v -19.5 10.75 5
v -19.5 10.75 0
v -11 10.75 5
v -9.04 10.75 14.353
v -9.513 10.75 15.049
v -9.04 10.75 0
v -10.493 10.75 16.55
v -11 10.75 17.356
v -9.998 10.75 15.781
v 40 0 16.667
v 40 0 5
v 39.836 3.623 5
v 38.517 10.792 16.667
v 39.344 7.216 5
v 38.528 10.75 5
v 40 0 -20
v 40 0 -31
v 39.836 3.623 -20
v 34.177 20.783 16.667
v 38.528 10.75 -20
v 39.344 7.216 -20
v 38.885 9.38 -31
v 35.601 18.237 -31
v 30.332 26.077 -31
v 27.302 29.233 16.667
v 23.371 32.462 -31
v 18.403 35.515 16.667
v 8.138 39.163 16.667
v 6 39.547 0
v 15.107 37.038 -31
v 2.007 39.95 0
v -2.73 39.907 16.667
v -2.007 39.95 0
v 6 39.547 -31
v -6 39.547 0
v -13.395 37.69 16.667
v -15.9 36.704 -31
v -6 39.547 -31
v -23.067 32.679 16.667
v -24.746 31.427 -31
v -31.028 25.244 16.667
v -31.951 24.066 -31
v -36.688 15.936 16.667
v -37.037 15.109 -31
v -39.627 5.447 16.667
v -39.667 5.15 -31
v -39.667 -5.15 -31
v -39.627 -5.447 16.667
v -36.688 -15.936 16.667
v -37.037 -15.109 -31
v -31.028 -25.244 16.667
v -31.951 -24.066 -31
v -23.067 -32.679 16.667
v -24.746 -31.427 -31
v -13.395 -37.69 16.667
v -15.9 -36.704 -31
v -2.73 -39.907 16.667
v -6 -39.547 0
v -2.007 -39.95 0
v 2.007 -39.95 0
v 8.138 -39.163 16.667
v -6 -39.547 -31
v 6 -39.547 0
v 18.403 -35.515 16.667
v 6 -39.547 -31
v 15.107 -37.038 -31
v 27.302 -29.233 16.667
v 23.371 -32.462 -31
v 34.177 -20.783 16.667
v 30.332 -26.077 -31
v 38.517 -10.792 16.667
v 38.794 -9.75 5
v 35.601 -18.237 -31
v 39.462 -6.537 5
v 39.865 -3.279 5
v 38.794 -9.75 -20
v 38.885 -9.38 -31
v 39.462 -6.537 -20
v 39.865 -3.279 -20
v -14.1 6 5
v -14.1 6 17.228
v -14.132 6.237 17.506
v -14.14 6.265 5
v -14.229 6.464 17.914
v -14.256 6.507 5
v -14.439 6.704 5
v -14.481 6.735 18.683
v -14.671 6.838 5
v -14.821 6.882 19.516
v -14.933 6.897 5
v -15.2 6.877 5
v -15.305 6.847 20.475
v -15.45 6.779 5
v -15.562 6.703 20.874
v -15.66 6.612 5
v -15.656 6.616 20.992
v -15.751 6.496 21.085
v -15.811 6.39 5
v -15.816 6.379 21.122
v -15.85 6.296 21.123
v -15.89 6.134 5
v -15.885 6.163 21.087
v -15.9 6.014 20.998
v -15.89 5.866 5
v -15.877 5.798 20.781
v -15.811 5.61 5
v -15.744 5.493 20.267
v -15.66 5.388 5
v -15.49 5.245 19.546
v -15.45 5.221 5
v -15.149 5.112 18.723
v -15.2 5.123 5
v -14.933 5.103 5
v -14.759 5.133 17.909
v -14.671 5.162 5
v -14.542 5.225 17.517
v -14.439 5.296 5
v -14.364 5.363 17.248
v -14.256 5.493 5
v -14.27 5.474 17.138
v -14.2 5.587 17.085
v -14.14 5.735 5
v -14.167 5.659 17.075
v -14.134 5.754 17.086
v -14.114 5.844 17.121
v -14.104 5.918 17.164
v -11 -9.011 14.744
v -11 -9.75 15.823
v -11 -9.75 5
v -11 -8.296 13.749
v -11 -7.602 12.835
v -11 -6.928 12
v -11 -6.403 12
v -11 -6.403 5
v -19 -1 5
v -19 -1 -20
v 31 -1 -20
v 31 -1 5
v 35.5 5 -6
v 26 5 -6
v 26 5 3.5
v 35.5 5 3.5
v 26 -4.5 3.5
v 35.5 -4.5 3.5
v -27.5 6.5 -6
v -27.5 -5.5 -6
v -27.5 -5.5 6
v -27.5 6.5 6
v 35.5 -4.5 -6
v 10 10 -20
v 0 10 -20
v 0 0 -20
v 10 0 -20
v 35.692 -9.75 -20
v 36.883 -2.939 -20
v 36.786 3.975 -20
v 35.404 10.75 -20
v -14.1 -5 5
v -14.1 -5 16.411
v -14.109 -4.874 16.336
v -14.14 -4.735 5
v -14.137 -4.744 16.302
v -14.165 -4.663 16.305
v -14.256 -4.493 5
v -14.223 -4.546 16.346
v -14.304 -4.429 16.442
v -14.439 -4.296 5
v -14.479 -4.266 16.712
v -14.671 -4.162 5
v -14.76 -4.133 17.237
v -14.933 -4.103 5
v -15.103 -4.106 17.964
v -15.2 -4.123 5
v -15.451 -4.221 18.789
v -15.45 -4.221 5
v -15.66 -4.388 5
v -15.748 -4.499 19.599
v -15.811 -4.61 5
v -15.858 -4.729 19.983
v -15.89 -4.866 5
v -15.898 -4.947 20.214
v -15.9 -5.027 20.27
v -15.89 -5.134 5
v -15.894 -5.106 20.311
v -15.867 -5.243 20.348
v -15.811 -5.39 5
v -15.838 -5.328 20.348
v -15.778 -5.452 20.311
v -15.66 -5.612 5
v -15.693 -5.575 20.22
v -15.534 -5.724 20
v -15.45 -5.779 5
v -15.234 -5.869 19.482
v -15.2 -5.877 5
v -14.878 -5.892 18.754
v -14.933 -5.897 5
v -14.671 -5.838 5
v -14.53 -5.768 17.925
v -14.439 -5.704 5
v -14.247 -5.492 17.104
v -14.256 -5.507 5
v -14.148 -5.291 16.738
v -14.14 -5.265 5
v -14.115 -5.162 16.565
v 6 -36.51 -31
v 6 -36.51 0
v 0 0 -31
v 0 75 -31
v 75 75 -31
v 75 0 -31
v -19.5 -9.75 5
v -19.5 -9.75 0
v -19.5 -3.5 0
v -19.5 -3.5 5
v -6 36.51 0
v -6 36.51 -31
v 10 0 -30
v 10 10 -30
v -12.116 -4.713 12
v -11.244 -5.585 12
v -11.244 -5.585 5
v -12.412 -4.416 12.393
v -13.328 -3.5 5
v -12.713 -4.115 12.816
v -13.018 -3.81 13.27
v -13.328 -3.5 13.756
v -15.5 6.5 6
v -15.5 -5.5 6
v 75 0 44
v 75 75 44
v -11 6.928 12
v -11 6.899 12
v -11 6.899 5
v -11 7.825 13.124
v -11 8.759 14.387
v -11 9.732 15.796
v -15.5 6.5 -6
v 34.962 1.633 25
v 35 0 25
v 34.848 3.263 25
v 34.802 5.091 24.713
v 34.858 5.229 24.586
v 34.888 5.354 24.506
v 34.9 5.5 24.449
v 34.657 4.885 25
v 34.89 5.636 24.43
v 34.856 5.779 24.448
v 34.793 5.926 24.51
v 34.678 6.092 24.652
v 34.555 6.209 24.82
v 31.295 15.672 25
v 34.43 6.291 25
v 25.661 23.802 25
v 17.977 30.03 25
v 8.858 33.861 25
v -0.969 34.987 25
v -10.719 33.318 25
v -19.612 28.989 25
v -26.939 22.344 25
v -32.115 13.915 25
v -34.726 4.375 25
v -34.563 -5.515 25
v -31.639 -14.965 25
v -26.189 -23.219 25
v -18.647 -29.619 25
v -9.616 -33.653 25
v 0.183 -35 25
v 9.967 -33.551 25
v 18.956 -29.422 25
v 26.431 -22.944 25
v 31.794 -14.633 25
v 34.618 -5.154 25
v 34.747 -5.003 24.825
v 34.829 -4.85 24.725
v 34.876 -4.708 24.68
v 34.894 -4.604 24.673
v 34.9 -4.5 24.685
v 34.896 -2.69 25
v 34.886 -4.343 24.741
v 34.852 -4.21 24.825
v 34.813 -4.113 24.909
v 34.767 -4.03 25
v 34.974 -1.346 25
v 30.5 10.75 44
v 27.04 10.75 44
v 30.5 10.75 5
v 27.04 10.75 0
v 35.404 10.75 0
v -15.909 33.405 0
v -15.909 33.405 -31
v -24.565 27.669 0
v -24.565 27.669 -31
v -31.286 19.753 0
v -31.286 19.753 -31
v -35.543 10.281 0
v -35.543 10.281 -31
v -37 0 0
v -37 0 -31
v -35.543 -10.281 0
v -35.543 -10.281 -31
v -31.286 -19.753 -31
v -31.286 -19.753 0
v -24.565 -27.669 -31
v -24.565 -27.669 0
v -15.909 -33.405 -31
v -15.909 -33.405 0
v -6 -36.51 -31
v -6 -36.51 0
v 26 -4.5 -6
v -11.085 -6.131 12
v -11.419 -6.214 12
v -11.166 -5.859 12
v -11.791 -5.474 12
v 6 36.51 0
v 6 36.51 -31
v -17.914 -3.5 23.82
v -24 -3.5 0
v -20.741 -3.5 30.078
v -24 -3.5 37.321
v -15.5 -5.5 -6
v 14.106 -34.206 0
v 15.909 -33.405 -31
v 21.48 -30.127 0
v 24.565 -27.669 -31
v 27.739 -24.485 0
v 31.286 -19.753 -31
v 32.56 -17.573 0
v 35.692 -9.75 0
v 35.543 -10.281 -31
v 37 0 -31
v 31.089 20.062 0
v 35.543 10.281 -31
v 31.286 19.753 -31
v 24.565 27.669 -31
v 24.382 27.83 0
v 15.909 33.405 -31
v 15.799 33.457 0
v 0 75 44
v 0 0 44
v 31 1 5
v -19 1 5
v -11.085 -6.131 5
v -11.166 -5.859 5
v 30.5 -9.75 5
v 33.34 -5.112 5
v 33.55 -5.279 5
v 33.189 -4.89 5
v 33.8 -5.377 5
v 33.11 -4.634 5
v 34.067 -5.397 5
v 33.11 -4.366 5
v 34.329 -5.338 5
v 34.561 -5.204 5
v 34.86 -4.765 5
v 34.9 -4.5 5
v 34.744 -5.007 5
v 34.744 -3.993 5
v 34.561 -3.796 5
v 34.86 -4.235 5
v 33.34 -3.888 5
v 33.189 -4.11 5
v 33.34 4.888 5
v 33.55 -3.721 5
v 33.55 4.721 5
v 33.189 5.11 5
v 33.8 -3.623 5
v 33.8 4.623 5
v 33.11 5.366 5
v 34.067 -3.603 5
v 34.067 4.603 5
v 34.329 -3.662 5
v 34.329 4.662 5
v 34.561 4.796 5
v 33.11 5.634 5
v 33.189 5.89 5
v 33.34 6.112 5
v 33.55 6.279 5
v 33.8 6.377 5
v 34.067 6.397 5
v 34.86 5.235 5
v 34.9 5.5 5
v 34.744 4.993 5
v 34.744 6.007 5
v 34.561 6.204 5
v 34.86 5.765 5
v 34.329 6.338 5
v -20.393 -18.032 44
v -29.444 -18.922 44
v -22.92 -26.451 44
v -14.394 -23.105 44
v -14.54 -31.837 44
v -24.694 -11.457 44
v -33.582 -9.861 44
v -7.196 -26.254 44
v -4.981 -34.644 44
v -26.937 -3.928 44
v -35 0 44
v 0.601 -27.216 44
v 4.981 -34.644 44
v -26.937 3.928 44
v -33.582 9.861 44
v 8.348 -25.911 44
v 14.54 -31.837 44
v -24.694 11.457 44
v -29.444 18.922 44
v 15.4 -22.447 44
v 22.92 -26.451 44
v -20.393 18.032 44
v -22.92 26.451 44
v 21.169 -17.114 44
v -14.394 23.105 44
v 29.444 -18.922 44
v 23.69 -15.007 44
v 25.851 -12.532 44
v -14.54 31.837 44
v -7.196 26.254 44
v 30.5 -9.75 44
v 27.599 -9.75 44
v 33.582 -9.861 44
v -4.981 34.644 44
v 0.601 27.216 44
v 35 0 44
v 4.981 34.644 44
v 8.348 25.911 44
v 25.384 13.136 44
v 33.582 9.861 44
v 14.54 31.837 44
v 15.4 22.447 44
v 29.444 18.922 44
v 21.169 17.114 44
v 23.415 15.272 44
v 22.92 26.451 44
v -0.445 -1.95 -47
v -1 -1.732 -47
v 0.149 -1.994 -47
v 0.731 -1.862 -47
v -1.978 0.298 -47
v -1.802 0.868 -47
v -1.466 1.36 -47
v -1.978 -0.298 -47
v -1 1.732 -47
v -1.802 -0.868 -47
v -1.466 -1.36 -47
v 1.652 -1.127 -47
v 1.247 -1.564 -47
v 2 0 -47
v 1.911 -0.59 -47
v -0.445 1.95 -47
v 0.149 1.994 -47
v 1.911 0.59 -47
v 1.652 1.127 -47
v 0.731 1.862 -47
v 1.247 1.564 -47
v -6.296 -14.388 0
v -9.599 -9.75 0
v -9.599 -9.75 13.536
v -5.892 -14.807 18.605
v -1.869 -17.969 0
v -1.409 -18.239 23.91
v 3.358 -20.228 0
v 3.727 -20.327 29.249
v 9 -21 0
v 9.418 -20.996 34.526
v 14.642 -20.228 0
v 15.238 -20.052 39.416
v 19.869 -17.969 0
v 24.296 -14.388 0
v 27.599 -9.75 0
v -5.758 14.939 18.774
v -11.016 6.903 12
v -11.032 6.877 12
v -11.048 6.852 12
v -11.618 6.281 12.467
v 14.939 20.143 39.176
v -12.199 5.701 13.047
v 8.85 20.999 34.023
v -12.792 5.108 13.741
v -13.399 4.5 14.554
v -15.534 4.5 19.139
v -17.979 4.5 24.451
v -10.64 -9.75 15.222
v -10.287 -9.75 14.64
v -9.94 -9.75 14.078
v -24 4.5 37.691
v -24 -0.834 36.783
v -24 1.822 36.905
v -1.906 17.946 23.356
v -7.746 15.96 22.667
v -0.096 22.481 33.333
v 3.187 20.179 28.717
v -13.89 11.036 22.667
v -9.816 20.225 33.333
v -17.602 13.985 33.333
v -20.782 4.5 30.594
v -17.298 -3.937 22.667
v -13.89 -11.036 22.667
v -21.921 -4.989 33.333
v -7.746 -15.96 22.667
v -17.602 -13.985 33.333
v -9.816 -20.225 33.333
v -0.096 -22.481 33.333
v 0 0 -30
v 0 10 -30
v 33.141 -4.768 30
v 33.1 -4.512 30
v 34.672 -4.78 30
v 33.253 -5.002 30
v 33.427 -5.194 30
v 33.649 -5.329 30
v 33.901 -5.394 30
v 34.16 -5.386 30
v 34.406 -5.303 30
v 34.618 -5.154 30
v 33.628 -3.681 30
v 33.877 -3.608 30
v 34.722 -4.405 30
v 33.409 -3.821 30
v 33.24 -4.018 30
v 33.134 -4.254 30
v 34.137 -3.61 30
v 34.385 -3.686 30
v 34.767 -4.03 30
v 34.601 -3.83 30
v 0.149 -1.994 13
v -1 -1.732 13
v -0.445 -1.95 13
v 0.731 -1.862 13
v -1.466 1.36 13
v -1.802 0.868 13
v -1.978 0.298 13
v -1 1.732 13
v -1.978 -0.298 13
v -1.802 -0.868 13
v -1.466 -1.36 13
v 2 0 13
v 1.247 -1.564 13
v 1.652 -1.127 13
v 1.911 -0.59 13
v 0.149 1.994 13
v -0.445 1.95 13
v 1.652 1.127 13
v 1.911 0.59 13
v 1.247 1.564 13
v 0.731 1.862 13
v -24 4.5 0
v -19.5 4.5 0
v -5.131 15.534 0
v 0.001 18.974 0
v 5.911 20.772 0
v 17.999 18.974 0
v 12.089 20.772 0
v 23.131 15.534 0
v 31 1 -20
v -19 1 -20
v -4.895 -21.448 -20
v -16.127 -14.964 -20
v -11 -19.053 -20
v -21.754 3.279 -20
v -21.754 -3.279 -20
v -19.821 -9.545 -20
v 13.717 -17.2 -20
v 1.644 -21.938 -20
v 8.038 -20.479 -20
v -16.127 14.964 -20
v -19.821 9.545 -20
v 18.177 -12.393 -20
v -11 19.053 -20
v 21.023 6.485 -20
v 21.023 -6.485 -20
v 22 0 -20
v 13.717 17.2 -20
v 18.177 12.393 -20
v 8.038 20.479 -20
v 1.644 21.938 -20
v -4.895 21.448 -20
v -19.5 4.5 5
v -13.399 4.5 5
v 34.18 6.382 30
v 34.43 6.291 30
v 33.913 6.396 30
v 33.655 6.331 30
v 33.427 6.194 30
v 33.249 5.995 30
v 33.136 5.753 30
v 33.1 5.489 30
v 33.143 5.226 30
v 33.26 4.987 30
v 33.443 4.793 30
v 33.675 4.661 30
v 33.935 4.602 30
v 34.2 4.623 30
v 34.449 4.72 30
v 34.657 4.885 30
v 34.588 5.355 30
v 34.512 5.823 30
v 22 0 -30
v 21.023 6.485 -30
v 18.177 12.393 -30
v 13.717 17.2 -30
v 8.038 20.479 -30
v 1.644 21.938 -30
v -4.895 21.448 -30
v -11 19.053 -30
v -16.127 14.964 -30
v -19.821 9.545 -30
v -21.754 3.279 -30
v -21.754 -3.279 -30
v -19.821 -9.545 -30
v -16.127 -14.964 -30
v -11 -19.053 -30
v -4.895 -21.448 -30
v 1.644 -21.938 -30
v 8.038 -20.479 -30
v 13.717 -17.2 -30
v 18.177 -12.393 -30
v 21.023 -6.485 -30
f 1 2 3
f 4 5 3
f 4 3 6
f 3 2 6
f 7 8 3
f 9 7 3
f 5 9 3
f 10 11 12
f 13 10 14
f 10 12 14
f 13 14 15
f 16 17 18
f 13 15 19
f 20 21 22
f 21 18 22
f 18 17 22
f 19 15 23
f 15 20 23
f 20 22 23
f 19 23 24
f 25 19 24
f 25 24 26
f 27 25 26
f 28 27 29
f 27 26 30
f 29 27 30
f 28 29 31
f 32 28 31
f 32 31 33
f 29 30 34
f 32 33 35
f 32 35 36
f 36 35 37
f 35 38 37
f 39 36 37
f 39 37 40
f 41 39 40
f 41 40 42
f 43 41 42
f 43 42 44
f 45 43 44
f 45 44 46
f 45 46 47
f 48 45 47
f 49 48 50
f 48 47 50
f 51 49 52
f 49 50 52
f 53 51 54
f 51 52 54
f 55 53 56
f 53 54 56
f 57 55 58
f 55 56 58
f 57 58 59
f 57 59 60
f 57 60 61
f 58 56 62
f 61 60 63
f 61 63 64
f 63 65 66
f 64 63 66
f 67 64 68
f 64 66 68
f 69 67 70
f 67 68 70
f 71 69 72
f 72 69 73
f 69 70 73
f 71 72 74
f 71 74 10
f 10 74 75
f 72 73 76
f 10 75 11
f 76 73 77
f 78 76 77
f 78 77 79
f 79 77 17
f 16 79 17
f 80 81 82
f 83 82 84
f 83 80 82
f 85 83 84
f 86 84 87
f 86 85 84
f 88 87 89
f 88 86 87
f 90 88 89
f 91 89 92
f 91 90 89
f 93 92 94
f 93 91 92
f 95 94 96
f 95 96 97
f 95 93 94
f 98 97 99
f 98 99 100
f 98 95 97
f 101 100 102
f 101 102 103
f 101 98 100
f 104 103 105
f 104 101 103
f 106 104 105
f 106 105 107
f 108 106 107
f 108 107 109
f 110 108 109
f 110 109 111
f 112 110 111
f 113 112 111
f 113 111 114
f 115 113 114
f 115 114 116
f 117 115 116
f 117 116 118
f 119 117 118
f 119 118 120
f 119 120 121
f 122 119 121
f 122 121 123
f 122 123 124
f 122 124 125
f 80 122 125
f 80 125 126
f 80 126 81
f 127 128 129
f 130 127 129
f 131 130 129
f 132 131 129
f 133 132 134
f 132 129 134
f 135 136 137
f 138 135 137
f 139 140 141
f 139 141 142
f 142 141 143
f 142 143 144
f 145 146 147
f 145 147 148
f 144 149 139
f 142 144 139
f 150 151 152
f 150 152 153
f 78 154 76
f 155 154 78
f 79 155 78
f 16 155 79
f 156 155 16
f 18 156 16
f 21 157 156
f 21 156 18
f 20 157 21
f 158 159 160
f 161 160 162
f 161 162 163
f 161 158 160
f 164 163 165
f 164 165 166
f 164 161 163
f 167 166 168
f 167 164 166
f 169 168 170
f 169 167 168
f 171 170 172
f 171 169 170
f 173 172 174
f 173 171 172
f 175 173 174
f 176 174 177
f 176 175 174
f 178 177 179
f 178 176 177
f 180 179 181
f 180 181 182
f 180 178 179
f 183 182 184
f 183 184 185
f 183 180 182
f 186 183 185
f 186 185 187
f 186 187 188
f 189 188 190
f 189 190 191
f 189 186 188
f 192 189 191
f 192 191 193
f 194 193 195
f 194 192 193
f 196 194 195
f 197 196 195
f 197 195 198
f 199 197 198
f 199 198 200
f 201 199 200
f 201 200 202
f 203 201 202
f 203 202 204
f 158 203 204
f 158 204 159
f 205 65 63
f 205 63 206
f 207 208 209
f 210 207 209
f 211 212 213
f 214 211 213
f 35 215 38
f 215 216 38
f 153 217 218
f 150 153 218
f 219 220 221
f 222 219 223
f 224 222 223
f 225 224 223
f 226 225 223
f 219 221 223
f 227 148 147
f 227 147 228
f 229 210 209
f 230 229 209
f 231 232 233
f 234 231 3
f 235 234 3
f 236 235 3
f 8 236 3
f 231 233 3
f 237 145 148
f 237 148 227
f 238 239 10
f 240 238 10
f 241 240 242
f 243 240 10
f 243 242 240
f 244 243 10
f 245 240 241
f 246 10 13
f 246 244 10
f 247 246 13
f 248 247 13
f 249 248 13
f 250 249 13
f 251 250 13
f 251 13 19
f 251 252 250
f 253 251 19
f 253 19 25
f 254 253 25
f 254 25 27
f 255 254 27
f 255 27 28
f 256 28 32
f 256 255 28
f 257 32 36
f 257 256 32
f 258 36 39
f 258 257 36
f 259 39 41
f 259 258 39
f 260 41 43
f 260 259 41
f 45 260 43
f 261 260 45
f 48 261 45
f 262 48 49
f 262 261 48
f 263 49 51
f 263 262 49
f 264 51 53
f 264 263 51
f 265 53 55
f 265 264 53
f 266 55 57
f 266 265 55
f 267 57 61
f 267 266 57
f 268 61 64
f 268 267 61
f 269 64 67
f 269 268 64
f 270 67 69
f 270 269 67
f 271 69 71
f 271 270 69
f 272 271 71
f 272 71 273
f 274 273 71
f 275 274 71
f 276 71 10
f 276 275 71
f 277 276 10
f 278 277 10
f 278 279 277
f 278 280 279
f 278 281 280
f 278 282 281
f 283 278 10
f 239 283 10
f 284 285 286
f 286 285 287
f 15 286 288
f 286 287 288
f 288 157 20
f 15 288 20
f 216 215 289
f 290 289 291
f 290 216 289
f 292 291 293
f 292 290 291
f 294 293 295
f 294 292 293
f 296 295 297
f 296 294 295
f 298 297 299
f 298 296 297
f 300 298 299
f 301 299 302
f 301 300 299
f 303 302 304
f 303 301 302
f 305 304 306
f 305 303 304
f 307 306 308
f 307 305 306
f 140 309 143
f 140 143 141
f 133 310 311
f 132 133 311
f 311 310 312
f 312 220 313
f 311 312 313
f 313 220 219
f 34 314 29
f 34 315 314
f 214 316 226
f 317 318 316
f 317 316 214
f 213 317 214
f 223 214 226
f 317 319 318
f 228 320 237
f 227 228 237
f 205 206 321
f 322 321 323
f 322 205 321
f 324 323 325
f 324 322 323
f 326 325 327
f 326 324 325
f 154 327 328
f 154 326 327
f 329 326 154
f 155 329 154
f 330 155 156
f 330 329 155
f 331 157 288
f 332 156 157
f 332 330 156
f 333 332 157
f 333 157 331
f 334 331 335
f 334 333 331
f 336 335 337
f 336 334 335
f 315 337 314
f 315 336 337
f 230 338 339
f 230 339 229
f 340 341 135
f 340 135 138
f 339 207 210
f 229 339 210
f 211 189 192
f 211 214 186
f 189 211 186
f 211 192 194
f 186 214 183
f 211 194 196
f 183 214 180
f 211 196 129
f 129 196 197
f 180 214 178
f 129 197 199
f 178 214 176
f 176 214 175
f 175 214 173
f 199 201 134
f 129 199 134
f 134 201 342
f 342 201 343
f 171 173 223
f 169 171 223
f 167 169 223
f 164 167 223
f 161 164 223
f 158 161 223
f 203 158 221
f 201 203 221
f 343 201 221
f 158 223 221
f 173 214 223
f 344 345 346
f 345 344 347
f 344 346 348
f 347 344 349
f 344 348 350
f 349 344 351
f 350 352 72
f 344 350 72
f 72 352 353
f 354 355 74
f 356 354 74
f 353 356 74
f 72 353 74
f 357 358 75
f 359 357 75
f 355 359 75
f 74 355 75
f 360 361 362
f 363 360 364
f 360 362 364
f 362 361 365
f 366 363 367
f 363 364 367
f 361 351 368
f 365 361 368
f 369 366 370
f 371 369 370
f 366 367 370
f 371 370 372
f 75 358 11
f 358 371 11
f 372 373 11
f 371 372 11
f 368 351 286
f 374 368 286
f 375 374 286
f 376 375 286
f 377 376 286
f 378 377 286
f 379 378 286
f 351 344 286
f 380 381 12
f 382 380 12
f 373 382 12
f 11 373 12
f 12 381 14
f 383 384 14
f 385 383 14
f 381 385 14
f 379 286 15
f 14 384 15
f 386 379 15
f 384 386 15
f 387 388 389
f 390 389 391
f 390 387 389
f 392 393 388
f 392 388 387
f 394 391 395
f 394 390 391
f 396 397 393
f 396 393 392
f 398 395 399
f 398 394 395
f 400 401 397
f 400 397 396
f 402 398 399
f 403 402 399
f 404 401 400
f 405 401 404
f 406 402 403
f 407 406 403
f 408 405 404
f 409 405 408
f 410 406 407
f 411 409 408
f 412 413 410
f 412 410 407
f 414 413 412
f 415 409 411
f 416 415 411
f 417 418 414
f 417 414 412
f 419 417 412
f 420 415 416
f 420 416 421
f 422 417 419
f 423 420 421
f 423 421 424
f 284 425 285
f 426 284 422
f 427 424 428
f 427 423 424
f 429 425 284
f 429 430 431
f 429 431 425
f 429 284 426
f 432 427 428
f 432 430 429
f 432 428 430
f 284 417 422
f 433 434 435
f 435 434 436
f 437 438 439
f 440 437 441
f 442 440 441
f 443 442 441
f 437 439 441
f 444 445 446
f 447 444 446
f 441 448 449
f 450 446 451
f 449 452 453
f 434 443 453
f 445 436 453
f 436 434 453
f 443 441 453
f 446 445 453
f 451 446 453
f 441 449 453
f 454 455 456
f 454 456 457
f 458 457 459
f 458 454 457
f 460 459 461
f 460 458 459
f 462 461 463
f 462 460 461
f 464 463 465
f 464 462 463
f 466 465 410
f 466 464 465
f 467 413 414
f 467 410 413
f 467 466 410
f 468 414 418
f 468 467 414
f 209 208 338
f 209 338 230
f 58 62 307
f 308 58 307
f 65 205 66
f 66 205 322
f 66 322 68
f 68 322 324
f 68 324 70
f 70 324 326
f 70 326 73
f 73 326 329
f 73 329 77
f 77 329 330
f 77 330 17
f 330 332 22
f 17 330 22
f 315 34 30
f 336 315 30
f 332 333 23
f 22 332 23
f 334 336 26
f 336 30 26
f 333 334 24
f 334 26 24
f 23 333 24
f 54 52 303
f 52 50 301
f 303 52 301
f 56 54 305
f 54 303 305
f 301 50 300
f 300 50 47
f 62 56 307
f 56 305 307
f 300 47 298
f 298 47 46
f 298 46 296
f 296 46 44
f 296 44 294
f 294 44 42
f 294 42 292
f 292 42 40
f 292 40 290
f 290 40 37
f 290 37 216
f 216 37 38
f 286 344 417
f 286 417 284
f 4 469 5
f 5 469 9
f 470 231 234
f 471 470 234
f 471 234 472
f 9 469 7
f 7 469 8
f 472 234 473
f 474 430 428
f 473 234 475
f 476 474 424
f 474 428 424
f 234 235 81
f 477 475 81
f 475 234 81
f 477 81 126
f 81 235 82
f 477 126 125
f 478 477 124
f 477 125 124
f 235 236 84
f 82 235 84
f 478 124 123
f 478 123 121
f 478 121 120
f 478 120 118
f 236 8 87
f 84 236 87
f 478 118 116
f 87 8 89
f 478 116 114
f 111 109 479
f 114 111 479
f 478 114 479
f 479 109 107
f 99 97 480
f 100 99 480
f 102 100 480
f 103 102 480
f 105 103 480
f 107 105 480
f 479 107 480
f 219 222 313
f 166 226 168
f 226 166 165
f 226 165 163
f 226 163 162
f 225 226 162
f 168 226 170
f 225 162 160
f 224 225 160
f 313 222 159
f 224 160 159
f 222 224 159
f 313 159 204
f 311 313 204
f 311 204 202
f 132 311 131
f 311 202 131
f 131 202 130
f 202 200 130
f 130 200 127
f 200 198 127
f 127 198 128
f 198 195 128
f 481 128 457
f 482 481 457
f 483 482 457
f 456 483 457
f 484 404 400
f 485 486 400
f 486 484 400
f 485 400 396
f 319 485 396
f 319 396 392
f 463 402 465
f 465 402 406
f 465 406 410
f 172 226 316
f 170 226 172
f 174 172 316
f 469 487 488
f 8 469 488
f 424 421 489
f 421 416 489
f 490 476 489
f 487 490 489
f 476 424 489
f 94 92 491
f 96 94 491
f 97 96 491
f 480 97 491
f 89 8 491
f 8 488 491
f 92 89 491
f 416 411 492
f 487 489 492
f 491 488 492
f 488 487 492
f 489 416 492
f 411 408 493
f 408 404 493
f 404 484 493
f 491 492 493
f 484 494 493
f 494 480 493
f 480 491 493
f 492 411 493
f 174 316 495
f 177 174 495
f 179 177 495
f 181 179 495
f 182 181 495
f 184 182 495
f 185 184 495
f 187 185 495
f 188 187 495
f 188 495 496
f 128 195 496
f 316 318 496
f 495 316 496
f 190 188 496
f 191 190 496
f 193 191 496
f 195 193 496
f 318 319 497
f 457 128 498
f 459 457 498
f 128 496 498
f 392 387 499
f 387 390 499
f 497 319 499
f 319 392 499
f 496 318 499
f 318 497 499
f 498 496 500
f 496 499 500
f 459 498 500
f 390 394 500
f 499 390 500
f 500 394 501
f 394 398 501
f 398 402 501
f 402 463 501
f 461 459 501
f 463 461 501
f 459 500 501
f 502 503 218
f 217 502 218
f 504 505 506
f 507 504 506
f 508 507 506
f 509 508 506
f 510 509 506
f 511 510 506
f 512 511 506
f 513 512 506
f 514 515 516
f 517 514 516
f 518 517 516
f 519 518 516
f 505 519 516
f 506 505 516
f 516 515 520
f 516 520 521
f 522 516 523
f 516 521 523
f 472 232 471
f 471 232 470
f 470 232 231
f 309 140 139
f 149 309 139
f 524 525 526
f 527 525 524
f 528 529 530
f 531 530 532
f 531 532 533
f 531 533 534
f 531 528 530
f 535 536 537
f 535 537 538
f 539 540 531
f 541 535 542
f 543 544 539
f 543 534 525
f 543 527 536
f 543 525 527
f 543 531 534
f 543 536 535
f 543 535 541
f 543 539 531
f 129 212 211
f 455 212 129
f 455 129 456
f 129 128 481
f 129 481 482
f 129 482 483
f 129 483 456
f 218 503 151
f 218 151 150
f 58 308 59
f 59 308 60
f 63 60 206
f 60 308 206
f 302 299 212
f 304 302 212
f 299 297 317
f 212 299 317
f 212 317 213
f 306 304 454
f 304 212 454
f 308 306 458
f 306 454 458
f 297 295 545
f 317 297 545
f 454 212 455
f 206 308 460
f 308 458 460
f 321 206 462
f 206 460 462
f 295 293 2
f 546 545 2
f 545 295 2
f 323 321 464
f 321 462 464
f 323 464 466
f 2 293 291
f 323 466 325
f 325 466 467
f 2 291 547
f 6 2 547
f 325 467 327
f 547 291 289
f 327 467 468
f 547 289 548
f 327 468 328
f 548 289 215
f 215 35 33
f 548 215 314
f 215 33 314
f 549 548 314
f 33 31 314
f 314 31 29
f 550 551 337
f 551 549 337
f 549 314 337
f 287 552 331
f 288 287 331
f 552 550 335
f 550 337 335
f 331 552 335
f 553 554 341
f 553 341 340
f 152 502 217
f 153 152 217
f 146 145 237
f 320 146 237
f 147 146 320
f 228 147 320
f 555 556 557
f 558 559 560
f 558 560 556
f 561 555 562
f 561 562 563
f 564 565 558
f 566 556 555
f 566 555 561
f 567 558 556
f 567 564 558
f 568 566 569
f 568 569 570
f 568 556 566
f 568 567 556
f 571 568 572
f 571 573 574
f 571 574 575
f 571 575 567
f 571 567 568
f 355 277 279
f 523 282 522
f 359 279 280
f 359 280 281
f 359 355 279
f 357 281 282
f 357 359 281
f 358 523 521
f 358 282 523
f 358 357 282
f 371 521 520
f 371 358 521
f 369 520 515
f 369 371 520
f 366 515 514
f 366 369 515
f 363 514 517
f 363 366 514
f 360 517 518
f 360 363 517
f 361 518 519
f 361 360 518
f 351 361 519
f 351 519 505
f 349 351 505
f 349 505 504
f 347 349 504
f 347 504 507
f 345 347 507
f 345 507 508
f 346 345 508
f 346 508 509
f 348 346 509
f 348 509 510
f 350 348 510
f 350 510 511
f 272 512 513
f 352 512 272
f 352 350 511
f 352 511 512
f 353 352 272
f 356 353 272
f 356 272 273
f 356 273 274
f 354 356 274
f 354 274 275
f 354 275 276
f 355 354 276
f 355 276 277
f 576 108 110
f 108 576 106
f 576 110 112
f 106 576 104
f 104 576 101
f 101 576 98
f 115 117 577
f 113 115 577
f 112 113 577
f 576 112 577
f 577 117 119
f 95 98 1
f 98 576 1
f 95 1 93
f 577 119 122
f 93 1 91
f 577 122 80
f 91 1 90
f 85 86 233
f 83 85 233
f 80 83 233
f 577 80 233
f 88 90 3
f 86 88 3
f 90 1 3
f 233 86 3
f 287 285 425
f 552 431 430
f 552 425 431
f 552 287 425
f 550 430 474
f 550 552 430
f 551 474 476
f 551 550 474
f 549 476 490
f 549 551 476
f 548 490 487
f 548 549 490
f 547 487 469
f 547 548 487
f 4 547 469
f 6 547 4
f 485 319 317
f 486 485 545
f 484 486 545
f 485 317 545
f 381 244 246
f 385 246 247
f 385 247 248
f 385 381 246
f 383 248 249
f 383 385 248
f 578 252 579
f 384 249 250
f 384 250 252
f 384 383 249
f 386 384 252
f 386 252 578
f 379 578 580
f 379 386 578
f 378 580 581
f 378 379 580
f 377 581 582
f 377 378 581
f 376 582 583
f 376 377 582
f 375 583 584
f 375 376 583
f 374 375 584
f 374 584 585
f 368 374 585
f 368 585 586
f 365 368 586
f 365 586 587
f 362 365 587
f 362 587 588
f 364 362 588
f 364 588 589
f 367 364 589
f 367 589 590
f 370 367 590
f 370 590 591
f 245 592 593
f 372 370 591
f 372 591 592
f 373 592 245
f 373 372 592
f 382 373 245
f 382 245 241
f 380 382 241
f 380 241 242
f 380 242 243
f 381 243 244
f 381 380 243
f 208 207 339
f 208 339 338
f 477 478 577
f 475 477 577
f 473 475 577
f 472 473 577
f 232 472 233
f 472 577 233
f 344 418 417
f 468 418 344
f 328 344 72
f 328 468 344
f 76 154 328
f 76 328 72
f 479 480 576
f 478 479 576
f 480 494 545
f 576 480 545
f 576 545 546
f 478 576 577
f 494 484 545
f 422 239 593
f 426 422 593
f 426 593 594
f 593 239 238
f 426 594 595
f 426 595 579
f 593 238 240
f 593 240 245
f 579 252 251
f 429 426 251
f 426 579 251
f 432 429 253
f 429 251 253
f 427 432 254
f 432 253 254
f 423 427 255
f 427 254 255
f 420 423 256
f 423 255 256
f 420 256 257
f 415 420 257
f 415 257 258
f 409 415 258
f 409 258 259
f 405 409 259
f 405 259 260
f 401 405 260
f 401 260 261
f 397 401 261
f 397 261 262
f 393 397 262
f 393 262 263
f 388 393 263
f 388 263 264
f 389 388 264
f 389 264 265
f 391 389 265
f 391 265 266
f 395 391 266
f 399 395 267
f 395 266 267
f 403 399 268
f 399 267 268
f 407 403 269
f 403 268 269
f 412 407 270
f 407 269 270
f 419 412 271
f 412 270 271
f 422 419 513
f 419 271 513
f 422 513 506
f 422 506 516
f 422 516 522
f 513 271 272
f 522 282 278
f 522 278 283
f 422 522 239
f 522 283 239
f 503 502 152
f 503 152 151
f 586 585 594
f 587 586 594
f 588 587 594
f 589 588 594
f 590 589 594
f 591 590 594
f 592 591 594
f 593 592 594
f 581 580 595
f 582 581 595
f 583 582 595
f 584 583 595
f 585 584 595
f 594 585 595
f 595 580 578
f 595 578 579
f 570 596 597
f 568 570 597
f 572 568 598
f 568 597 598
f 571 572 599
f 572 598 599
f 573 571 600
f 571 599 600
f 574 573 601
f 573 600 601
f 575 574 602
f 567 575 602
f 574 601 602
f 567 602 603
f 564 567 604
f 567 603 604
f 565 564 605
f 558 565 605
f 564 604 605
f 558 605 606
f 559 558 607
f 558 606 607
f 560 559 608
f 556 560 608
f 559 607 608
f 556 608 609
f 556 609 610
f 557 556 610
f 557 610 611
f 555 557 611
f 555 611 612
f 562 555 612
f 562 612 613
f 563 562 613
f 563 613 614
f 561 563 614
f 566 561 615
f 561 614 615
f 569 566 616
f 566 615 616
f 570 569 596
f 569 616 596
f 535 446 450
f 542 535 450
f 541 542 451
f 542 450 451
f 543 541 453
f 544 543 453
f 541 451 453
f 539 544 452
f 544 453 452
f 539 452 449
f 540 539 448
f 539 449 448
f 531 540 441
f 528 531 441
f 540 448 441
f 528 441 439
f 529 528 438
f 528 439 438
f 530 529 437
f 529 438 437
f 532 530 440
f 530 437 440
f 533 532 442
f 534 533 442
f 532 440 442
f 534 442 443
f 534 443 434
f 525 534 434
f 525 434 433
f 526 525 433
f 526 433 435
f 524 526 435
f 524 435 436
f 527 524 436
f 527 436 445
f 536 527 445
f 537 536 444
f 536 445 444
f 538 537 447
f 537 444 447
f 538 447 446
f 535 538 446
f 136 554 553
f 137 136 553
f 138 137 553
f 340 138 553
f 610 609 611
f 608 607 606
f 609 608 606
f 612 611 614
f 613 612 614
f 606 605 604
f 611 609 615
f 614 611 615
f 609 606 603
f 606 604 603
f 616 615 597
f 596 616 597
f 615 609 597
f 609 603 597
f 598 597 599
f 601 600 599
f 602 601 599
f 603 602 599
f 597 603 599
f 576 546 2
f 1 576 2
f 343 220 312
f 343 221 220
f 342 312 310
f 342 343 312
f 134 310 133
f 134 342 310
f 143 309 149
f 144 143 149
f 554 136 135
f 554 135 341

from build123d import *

# Parameters (mm, degrees)
CYLINDER001_R          = 2
CYLINDER001_DEPTH      = 60
BOX001_W               = 64.5
BOX001_H               = 20.5
BOX001_DEPTH           = 25
BOX002_W               = 10
BOX002_H               = 10
BOX002_DEPTH           = 60
BOX002_PLACEMENT_ANGLE = 45
CYLINDER003_R          = 0.9
CYLINDER003_DEPTH      = 30
CYLINDER004_R          = 0.9
CYLINDER004_DEPTH      = 30
CYLINDER005_R          = 0.9
CYLINDER005_DEPTH      = 30
CYLINDER002_R          = 0.9
CYLINDER002_DEPTH      = 30
BOX006_W               = 12
BOX006_H               = 101
BOX006_DEPTH           = 50
TUBE001_R              = 42
TUBE001_R_2            = 35
TUBE001_DEPTH          = 42
CHAMFER_SIZE2          = 10
CHAMFER_SIZE           = 6
BOX010_W               = 20
BOX010_H               = 8
BOX010_DEPTH           = 60
CYLINDER007_R          = 21
CYLINDER007_DEPTH      = 60
BOX_W                  = 41.5
BOX_H                  = 20.5
BOX_DEPTH              = 51
TUBE_R                 = 40
TUBE_R_2               = 37
TUBE_DEPTH             = 31
CYLINDER_R             = 40
CYLINDER_DEPTH         = 44
BOX003_W               = 50
BOX003_H               = 2
BOX003_DEPTH           = 25
BOX004_W               = 10
BOX004_H               = 10
BOX004_DEPTH           = 10
CYLINDER006_R          = 22
CYLINDER006_DEPTH      = 10
BOX009_W               = 75
BOX009_H               = 75
BOX009_DEPTH           = 75
BOX011_W               = 9.5
BOX011_H               = 9.5
BOX011_DEPTH           = 9.5
BOX012_W               = 12
BOX012_H               = 12
BOX012_DEPTH           = 12


with BuildPart() as cylinder_stred:
    # Cylinder001 → Cylinder001 (new body)
    with BuildSketch(Plane.XY.offset(-47)):
        Circle(CYLINDER001_R)
    extrude(amount=CYLINDER001_DEPTH)


with BuildPart() as cube001:
    # Box001 → Box001 (new body)
    with BuildSketch(Plane(origin=(-19.5, -9.75, -20), x_dir=(1, 0, 0), z_dir=(0, 0, 1))):
        with Locations((32.25, 10.25)):
            Rectangle(BOX001_W, BOX001_H)
    extrude(amount=BOX001_DEPTH)


with BuildPart() as cube002_kabel:
    # Box002 → Box002 (new body)
    with BuildSketch(Plane.XY):
        with Locations((5, 5)):
            Rectangle(BOX002_W, BOX002_H)
    extrude(amount=BOX002_DEPTH)


with BuildPart() as cube002_kabel_1:
    # Box002 placement: moved
    add(cube002_kabel.part.moved(Location((-10.292893, -6.535534, 0))).rotate(Axis((-10.292893, -6.535534, 0), (0, 0, 1)), BOX002_PLACEMENT_ANGLE))


with BuildPart() as cylinder003:
    # Cylinder003 → Cylinder003 (new body)
    with BuildSketch(Plane(origin=(-15, -5, 0), x_dir=(1, 0, 0), z_dir=(0, 0, 1))):
        Circle(CYLINDER003_R)
    extrude(amount=CYLINDER003_DEPTH)


with BuildPart() as cylinder004:
    # Cylinder004 → Cylinder004 (new body)
    with BuildSketch(Plane(origin=(34, -4.5, 0), x_dir=(1, 0, 0), z_dir=(0, 0, 1))):
        Circle(CYLINDER004_R)
    extrude(amount=CYLINDER004_DEPTH)


with BuildPart() as cylinder005:
    # Cylinder005 → Cylinder005 (new body)
    with BuildSketch(Plane(origin=(34, 5.5, 0), x_dir=(1, 0, 0), z_dir=(0, 0, 1))):
        Circle(CYLINDER005_R)
    extrude(amount=CYLINDER005_DEPTH)


with BuildPart() as cylinder:
    # Cylinder002 → Cylinder002 (new body)
    with BuildSketch(Plane(origin=(-15, 6, 0), x_dir=(1, 0, 0), z_dir=(0, 0, 1))):
        Circle(CYLINDER002_R)
    extrude(amount=CYLINDER002_DEPTH)


with BuildPart() as cube005:
    # Box006 → Box006 (new body)
    with BuildSketch(Plane(origin=(-6, -43, -50), x_dir=(1, 0, 0), z_dir=(0, 0, 1))):
        with Locations((6, 50.5)):
            Rectangle(BOX006_W, BOX006_H)
    extrude(amount=BOX006_DEPTH)


with BuildPart() as cone:
    # Cone → Cone (revolve)
    with BuildSketch(Plane(origin=(0, 0, 12), x_dir=(1, 0, 0), z_dir=(0, -1, 0))):
        Polygon((0, 0), (13, 0), (33, 45), (0, 45), align=None)
    revolve(axis=Axis((0, 0, 12), (0, 0, 1)))


with BuildPart() as chamfer_body:
    # Tube001 → Tube001 (new body)
    with BuildSketch(Plane.XY.offset(15)):
        Circle(TUBE001_R)
        Circle(TUBE001_R_2, mode=Mode.SUBTRACT)
    extrude(amount=TUBE001_DEPTH)

    # Chamfer
    chamfer_edges = [chamfer_body.edges().sort_by_distance(p)[0] for p in [
        (-35, 0, 15),
    ]]
    chamfer_side = chamfer_body.faces().sort_by_distance((-40.812061, 0, 15))[0]
    chamfer(chamfer_edges, length=CHAMFER_SIZE, length2=CHAMFER_SIZE2, reference=chamfer_side)


with BuildPart() as cube007_drot:
    # Box010 → Box010 (new body)
    with BuildSketch(Plane(origin=(-24, -3.5, 0), x_dir=(1, 0, 0), z_dir=(0, 0, 1))):
        with Locations((10, 4)):
            Rectangle(BOX010_W, BOX010_H)
    extrude(amount=BOX010_DEPTH)


with BuildPart() as cylinder007:
    # Cylinder007 → Cylinder007 (new body)
    with BuildSketch(Plane(origin=(9, 0, 0), x_dir=(1, 0, 0), z_dir=(0, 0, 1))):
        Circle(CYLINDER007_R)
    extrude(amount=CYLINDER007_DEPTH)


with BuildPart() as fusion:
    # Box → Box (new body)
    with BuildSketch(Plane(origin=(-11, -9.75, 0), x_dir=(1, 0, 0), z_dir=(0, 0, 1))):
        with Locations((20.75, 10.25)):
            Rectangle(BOX_W, BOX_H)
    extrude(amount=BOX_DEPTH)

    # Fusion: union Cube001, Cube002-kabel, Cylinder003, Cylinder004, Cylinder005, Cylinder, Cube005, Cone, Chamfer body, Cube007_drot, Cylinder007
    add(cube001.part)
    add(cube002_kabel_1.part)
    add(cylinder003.part)
    add(cylinder004.part)
    add(cylinder005.part)
    add(cylinder.part)
    add(cube005.part)
    add(cone.part)
    add(chamfer_body.part)
    add(cube007_drot.part)
    add(cylinder007.part)


with BuildPart() as tube:
    # Tube → Tube (new body)
    with BuildSketch(Plane.XY.offset(-31)):
        Circle(TUBE_R)
        Circle(TUBE_R_2, mode=Mode.SUBTRACT)
    extrude(amount=TUBE_DEPTH)


with BuildPart() as cut:
    # Cylinder → Cylinder (new body)
    with BuildSketch(Plane.XY):
        Circle(CYLINDER_R)
    extrude(amount=CYLINDER_DEPTH)

    # Fusion001: union Tube
    add(tube.part)

    # Cut: cut Fusion
    add(fusion.part, mode=Mode.SUBTRACT)


with BuildPart() as cube002:
    # Box003 → Box003 (new body)
    with BuildSketch(Plane(origin=(-19, -1, -20), x_dir=(1, 0, 0), z_dir=(0, 0, 1))):
        with Locations((25, 1)):
            Rectangle(BOX003_W, BOX003_H)
    extrude(amount=BOX003_DEPTH)


with BuildPart() as cube003:
    # Box004 → Box004 (new body)
    with BuildSketch(Plane.XY.offset(-30)):
        with Locations((5, 5)):
            Rectangle(BOX004_W, BOX004_H)
    extrude(amount=BOX004_DEPTH)


with BuildPart() as cylinder006:
    # Cylinder006 → Cylinder006 (new body)
    with BuildSketch(Plane.XY.offset(-30)):
        Circle(CYLINDER006_R)
    extrude(amount=CYLINDER006_DEPTH)


with BuildPart() as cube006:
    # Box009 → Box009 (new body)
    with BuildSketch(Plane.XY.offset(-31)):
        with Locations((37.5, 37.5)):
            Rectangle(BOX009_W, BOX009_H)
    extrude(amount=BOX009_DEPTH)


with BuildPart() as cube007:
    # Box011 → Box011 (new body)
    with BuildSketch(Plane(origin=(26, -4.5, -6), x_dir=(1, 0, 0), z_dir=(0, 0, 1))):
        with Locations((4.75, 4.75)):
            Rectangle(BOX011_W, BOX011_H)
    extrude(amount=BOX011_DEPTH)


with BuildPart() as cube008:
    # Box012 → Box012 (new body)
    with BuildSketch(Plane(origin=(-27.5, -5.5, -6), x_dir=(1, 0, 0), z_dir=(0, 0, 1))):
        with Locations((6, 6)):
            Rectangle(BOX012_W, BOX012_H)
    extrude(amount=BOX012_DEPTH)


solid = Compound([cylinder_stred.part, cut.part, cube002.part, cube003.part, cylinder006.part, cube006.part, cube007.part, cube008.part])
